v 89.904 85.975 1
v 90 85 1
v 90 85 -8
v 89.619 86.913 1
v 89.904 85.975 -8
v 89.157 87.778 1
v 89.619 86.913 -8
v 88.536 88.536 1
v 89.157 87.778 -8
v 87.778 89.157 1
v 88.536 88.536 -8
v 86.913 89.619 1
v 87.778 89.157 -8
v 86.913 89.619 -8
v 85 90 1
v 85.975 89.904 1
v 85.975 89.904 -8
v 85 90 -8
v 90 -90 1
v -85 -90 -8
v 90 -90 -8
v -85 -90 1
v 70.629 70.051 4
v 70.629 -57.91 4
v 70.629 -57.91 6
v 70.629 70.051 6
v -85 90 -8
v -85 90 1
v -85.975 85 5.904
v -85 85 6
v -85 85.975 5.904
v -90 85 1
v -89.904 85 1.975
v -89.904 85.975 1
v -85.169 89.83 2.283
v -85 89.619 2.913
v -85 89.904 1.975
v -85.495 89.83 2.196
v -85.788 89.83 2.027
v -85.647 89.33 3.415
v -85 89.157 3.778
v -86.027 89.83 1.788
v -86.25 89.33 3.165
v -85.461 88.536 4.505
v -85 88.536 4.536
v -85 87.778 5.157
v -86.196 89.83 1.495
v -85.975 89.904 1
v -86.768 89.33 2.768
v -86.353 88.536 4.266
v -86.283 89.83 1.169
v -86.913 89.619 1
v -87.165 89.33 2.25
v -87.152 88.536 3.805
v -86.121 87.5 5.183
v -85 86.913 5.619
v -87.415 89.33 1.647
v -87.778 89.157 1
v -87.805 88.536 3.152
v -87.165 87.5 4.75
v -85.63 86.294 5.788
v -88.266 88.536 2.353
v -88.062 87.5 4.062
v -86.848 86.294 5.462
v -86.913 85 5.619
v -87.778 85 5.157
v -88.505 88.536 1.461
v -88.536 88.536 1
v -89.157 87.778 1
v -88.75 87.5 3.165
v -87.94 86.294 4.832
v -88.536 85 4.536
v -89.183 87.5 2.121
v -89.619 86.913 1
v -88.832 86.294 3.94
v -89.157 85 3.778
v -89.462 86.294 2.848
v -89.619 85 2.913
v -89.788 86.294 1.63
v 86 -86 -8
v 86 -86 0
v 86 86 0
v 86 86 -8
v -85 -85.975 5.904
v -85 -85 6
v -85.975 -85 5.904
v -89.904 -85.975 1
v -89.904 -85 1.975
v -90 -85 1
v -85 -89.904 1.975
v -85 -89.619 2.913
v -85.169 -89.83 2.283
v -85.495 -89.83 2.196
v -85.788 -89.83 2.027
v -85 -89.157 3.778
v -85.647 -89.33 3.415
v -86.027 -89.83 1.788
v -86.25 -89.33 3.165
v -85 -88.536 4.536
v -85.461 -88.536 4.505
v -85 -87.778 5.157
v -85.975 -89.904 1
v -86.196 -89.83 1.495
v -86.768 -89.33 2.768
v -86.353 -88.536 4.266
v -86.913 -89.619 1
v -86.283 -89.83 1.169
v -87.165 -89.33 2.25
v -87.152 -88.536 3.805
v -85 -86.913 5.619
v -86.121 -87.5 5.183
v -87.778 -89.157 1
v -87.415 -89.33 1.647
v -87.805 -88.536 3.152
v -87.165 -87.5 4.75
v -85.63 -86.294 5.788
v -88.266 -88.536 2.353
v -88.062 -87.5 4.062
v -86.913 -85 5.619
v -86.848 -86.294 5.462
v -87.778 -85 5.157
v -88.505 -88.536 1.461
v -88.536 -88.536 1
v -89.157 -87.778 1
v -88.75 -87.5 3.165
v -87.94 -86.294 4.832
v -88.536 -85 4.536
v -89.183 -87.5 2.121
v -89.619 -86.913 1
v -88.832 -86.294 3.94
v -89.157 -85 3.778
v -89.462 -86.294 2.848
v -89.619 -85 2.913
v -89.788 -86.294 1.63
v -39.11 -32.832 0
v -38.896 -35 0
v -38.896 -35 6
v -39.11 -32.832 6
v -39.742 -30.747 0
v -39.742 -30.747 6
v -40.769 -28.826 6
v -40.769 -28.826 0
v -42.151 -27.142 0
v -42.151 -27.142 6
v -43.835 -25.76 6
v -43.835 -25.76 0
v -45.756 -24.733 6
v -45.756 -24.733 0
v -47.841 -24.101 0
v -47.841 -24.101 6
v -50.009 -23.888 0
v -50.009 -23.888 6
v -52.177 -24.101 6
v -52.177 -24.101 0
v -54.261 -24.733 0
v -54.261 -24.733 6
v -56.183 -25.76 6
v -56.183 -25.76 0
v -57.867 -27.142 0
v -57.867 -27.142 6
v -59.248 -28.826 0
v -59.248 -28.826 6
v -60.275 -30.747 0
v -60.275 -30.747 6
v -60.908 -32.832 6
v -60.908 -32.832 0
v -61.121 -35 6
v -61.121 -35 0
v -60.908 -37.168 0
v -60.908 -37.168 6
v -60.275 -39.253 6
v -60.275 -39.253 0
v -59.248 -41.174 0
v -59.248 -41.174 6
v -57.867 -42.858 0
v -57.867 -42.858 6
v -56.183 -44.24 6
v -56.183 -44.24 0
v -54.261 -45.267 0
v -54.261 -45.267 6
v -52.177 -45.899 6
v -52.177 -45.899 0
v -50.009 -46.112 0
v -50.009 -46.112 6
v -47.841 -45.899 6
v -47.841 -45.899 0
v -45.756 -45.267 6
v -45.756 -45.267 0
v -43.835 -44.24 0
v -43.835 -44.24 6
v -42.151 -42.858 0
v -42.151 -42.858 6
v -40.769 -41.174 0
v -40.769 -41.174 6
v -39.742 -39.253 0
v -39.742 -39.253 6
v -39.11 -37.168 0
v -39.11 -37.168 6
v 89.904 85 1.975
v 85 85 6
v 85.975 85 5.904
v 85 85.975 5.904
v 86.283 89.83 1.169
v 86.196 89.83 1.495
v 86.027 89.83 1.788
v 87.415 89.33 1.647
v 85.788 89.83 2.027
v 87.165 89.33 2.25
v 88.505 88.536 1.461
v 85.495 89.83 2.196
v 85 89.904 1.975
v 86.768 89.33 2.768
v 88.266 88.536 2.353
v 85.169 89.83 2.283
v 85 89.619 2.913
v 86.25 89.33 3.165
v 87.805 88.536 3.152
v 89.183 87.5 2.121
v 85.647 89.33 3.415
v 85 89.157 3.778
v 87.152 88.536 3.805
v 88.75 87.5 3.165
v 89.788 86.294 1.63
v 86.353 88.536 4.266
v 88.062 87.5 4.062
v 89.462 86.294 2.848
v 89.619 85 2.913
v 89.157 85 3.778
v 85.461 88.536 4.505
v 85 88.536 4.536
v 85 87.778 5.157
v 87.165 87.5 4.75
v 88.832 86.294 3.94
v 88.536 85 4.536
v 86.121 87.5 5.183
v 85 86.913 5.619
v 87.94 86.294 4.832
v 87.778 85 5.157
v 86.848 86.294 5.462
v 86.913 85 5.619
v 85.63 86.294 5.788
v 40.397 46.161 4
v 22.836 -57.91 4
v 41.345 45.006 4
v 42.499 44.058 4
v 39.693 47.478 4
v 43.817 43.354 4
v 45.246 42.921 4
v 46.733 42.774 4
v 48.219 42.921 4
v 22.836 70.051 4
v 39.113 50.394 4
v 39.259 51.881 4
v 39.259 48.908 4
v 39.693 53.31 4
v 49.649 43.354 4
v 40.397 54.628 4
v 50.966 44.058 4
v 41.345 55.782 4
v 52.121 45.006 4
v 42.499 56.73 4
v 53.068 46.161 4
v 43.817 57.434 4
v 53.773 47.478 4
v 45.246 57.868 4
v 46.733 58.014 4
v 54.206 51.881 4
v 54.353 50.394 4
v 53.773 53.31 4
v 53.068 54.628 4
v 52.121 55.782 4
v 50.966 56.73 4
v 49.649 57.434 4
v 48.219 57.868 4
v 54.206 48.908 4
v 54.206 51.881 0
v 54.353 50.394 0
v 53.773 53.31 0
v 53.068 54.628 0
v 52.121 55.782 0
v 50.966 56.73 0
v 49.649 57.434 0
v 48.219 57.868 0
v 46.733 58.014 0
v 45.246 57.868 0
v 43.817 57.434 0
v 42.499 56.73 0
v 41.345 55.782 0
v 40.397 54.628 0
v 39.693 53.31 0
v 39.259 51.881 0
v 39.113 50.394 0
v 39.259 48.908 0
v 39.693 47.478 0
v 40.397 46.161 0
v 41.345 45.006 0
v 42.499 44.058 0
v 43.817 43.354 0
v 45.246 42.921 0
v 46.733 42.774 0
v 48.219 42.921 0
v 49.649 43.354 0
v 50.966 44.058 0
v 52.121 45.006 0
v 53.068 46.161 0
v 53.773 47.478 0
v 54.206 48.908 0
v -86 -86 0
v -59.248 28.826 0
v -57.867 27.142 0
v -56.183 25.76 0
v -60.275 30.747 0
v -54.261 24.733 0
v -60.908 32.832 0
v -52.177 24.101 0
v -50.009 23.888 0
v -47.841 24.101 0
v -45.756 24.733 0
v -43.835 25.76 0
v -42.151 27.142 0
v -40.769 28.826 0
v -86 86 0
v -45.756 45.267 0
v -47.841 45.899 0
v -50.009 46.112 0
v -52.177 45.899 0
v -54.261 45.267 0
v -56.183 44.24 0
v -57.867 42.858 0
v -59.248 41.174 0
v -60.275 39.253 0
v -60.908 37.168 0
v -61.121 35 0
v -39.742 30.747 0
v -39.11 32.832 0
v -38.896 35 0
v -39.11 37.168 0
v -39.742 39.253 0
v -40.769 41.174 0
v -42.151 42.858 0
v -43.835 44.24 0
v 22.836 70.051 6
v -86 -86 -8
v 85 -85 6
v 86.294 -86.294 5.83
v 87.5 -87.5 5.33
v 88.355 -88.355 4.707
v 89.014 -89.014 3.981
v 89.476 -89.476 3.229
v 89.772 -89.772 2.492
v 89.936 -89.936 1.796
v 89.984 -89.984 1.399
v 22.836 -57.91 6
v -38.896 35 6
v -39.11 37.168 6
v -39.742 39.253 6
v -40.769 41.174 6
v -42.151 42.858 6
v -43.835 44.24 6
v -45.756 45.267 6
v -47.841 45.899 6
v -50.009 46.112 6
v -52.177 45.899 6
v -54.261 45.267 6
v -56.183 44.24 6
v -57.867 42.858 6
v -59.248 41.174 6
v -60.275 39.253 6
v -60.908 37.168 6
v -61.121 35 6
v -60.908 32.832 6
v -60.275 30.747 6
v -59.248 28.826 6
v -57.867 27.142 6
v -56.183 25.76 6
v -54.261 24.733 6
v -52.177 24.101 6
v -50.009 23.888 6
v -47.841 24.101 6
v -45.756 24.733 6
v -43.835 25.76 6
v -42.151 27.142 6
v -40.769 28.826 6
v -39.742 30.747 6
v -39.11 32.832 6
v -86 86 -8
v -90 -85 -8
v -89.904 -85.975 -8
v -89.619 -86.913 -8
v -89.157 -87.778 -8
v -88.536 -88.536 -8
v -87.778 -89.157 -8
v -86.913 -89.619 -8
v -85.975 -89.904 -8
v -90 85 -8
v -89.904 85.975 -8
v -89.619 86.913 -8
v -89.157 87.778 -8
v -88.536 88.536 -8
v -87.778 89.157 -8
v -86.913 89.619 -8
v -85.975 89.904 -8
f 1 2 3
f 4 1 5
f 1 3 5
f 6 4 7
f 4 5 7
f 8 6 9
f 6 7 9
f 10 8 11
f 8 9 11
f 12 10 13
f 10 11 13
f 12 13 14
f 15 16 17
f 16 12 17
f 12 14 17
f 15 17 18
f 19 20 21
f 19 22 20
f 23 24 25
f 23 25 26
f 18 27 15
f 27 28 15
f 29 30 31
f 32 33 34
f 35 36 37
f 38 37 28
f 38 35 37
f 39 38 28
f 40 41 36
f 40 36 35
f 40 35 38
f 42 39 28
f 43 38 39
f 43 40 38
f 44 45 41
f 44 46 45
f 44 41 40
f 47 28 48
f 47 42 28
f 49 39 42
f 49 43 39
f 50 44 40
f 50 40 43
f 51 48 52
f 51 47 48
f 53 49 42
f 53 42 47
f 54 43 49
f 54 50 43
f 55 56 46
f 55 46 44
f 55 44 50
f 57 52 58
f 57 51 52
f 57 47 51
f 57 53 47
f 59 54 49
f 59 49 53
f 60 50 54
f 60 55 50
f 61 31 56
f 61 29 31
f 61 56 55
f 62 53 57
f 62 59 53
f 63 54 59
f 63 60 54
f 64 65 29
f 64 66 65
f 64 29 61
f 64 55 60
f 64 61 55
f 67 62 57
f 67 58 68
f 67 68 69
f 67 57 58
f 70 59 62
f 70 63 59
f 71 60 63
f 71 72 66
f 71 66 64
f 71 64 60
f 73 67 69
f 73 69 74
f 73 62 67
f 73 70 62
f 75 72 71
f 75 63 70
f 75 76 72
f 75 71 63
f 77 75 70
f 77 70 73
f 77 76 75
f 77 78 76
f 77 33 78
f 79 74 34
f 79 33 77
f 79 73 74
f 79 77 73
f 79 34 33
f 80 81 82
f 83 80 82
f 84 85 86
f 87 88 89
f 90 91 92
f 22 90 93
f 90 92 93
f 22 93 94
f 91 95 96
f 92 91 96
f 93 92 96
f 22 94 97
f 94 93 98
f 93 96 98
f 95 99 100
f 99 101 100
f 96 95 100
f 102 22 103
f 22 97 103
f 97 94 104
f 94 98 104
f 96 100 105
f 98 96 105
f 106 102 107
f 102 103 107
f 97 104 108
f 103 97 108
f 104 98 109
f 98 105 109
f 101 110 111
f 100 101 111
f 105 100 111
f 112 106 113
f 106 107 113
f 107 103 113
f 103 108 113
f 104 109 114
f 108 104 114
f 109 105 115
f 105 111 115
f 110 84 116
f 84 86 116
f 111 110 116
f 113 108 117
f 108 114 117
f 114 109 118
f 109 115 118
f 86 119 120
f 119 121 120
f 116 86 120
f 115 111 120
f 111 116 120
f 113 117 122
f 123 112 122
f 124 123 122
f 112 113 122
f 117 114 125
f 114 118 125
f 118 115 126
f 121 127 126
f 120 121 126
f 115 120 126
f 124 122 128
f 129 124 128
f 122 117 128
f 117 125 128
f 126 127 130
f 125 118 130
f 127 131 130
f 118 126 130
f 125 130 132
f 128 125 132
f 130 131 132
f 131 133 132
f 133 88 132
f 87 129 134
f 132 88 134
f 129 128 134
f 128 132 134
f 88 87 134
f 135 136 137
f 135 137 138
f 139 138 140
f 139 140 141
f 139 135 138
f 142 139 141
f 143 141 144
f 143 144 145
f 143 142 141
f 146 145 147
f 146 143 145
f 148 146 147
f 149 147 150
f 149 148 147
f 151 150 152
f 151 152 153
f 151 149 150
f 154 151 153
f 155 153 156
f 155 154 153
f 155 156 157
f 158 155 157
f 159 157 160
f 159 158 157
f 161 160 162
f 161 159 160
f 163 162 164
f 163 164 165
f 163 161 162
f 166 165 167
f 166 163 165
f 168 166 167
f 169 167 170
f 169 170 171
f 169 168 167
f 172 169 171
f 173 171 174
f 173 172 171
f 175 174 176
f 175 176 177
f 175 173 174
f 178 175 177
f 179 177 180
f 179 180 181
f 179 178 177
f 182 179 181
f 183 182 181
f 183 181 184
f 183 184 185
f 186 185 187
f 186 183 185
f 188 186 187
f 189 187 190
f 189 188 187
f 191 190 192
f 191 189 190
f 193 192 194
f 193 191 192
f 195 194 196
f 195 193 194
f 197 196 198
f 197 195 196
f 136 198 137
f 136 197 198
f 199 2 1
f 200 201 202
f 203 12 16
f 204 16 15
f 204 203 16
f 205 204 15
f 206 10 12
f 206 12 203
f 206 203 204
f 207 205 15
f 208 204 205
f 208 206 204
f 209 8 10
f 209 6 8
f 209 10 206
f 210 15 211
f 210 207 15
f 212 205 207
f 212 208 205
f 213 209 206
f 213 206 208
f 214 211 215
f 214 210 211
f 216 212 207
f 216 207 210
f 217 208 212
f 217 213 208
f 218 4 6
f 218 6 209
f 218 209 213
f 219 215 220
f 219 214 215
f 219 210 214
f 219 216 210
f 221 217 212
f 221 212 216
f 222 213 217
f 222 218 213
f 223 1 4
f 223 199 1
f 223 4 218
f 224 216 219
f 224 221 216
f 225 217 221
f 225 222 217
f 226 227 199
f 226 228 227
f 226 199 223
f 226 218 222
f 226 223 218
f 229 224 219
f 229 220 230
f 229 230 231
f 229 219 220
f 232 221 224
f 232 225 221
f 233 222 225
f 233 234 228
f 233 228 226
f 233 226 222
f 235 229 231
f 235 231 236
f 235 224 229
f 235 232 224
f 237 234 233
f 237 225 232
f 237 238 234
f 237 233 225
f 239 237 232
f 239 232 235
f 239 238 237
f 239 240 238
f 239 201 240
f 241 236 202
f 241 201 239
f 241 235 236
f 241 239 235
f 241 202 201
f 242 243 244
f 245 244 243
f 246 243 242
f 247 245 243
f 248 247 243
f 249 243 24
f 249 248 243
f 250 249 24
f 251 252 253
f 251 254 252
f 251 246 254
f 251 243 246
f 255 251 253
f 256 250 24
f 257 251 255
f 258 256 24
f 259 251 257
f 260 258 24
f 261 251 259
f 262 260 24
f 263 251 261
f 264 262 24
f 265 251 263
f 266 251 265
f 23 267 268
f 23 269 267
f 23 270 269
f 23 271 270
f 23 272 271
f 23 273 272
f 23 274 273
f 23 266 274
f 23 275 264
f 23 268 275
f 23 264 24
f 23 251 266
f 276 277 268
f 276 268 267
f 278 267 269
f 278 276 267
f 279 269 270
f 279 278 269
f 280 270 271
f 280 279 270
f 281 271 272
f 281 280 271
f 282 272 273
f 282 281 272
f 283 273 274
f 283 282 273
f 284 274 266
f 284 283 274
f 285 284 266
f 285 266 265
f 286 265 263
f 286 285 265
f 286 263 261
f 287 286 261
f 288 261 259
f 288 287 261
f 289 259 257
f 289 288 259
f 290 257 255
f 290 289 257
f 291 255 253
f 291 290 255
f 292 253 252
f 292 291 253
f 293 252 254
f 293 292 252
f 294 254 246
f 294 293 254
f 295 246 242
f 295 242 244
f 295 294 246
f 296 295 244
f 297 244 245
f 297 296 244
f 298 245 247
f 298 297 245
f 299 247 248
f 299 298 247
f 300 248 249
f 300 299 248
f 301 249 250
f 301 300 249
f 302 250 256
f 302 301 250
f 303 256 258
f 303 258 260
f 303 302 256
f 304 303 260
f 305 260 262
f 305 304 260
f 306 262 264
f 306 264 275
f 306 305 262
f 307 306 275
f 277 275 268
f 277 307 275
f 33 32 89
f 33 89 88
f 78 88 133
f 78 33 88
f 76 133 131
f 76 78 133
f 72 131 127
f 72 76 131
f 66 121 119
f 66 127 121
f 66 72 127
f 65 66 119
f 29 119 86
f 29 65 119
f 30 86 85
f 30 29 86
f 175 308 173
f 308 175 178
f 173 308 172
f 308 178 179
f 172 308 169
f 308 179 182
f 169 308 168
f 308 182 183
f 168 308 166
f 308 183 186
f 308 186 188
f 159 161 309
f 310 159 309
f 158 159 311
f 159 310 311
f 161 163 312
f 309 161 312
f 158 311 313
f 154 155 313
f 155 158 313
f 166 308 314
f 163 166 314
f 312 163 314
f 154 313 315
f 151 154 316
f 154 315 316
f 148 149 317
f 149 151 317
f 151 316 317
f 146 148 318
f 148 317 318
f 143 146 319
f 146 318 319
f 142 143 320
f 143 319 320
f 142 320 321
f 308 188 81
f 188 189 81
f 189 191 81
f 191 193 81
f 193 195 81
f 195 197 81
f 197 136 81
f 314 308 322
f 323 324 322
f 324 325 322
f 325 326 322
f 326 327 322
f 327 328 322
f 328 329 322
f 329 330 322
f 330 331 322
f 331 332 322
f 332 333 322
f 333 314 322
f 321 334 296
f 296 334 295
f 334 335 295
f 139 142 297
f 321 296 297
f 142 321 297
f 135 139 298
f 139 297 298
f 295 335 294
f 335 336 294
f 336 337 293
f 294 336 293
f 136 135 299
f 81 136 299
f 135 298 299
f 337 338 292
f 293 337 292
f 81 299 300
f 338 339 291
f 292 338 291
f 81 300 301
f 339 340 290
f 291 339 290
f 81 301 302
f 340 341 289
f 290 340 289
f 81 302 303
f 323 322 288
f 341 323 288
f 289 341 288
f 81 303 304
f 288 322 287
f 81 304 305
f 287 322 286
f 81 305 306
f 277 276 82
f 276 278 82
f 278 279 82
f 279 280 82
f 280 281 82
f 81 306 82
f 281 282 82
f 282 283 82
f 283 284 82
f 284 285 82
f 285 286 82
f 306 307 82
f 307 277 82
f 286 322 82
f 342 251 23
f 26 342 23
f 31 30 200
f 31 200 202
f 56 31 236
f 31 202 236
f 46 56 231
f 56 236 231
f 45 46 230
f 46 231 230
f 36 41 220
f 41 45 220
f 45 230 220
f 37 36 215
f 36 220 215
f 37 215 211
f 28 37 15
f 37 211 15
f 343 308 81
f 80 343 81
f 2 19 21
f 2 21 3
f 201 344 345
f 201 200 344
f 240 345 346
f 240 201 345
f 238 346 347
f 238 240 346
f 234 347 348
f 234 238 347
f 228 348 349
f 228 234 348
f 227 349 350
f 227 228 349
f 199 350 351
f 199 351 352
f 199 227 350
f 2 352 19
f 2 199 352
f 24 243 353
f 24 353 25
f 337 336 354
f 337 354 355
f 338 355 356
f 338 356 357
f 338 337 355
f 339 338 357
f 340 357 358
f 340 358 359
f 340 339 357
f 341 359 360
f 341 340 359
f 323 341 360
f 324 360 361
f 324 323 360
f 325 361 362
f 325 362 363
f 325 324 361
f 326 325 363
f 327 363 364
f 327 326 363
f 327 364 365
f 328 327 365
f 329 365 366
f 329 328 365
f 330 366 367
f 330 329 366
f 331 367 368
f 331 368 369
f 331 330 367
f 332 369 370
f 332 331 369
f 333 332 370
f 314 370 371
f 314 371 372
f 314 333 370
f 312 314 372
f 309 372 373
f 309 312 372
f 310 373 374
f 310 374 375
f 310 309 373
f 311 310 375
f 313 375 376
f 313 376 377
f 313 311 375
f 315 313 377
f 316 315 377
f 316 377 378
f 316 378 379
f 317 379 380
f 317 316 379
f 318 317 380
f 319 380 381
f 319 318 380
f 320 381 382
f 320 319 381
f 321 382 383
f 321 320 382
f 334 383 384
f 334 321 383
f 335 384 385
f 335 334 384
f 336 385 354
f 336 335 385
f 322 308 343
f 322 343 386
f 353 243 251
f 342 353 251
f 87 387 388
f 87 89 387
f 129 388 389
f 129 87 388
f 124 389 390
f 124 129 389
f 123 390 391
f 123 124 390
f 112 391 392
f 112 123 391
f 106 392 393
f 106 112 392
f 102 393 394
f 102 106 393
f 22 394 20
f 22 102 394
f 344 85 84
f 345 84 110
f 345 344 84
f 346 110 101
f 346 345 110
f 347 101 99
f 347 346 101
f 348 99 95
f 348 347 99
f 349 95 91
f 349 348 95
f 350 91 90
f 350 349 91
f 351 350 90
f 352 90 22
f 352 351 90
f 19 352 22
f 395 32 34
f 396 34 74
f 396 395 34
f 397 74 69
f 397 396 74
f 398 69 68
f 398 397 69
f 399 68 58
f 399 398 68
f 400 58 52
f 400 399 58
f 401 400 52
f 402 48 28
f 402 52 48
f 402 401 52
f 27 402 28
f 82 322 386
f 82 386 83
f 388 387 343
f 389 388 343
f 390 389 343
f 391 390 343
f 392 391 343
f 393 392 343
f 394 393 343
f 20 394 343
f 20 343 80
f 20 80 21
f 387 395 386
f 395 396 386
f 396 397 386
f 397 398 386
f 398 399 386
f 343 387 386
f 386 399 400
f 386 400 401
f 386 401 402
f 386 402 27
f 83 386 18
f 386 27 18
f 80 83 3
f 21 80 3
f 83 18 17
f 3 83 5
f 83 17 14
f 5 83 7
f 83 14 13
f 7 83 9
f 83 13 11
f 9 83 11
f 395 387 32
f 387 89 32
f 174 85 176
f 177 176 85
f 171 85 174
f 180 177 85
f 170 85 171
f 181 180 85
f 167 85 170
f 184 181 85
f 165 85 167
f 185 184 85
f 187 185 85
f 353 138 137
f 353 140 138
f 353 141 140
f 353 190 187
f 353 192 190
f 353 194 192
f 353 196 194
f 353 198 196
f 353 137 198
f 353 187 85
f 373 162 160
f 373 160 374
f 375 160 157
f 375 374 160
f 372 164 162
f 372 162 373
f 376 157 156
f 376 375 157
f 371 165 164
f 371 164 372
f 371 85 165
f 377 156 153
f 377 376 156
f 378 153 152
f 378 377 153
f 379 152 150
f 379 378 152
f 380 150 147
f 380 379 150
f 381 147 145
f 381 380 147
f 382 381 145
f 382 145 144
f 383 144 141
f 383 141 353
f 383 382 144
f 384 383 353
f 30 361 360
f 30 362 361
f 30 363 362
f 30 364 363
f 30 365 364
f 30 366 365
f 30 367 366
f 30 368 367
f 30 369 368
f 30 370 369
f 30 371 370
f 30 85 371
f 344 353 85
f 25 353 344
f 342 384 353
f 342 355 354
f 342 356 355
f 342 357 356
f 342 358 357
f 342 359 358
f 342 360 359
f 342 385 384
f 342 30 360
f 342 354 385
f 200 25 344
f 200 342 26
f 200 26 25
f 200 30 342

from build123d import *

# Parameters (mm, degrees)
F0_W     = 180
F0_H     = 180
F0_R     = 11.1125
F0_W_2   = 47.792598
F0_H_2   = 127.960831
F1_DEPTH = 6
F0_R_2   = 7.62
F2_DEPTH = 4
F3_W     = 180
F3_H     = 180
F3_W_2   = 172
F3_H_2   = 172
F4_DEPTH = 8
F5_R     = 5


with BuildPart() as f1:
    # F0 (on Top) → F1 (new body)
    with BuildSketch(Plane.XY):
        Rectangle(F0_W, F0_H)
        with Locations((-50.008792, -35)):
            Circle(F0_R, mode=Mode.SUBTRACT)
        with Locations((-50.008792, 35)):
            Circle(F0_R, mode=Mode.SUBTRACT)
        with Locations((46.732679, 6.070435)):
            Rectangle(F0_W_2, F0_H_2, mode=Mode.SUBTRACT)
    extrude(amount=F1_DEPTH)

    # F0 (on Top) → F2 (join)
    with BuildSketch(Plane.XY):
        with Locations((46.732679, 6.070435)):
            Rectangle(F0_W_2, F0_H_2)
        with Locations((46.732679, 50.394215)):
            Circle(F0_R_2, mode=Mode.SUBTRACT)
    extrude(amount=F2_DEPTH)

    # F3 (on Top) → F4 (join)
    with BuildSketch(Plane.XY):
        Rectangle(F3_W, F3_H)
        Rectangle(F3_W_2, F3_H_2, mode=Mode.SUBTRACT)
    extrude(amount=-F4_DEPTH)

    # F5
    f5_edges = [f1.edges().sort_by_distance(p)[0] for p in [
        (-90, 0, 6),
        (0, -90, 6),
        (90, 0, 6),
        (90, 90, -1),
        (0, 90, 6),
        (-90, 90, -1),
        (-90, -90, -1),
    ]]
    fillet(f5_edges, radius=F5_R)


solid = f1.part
